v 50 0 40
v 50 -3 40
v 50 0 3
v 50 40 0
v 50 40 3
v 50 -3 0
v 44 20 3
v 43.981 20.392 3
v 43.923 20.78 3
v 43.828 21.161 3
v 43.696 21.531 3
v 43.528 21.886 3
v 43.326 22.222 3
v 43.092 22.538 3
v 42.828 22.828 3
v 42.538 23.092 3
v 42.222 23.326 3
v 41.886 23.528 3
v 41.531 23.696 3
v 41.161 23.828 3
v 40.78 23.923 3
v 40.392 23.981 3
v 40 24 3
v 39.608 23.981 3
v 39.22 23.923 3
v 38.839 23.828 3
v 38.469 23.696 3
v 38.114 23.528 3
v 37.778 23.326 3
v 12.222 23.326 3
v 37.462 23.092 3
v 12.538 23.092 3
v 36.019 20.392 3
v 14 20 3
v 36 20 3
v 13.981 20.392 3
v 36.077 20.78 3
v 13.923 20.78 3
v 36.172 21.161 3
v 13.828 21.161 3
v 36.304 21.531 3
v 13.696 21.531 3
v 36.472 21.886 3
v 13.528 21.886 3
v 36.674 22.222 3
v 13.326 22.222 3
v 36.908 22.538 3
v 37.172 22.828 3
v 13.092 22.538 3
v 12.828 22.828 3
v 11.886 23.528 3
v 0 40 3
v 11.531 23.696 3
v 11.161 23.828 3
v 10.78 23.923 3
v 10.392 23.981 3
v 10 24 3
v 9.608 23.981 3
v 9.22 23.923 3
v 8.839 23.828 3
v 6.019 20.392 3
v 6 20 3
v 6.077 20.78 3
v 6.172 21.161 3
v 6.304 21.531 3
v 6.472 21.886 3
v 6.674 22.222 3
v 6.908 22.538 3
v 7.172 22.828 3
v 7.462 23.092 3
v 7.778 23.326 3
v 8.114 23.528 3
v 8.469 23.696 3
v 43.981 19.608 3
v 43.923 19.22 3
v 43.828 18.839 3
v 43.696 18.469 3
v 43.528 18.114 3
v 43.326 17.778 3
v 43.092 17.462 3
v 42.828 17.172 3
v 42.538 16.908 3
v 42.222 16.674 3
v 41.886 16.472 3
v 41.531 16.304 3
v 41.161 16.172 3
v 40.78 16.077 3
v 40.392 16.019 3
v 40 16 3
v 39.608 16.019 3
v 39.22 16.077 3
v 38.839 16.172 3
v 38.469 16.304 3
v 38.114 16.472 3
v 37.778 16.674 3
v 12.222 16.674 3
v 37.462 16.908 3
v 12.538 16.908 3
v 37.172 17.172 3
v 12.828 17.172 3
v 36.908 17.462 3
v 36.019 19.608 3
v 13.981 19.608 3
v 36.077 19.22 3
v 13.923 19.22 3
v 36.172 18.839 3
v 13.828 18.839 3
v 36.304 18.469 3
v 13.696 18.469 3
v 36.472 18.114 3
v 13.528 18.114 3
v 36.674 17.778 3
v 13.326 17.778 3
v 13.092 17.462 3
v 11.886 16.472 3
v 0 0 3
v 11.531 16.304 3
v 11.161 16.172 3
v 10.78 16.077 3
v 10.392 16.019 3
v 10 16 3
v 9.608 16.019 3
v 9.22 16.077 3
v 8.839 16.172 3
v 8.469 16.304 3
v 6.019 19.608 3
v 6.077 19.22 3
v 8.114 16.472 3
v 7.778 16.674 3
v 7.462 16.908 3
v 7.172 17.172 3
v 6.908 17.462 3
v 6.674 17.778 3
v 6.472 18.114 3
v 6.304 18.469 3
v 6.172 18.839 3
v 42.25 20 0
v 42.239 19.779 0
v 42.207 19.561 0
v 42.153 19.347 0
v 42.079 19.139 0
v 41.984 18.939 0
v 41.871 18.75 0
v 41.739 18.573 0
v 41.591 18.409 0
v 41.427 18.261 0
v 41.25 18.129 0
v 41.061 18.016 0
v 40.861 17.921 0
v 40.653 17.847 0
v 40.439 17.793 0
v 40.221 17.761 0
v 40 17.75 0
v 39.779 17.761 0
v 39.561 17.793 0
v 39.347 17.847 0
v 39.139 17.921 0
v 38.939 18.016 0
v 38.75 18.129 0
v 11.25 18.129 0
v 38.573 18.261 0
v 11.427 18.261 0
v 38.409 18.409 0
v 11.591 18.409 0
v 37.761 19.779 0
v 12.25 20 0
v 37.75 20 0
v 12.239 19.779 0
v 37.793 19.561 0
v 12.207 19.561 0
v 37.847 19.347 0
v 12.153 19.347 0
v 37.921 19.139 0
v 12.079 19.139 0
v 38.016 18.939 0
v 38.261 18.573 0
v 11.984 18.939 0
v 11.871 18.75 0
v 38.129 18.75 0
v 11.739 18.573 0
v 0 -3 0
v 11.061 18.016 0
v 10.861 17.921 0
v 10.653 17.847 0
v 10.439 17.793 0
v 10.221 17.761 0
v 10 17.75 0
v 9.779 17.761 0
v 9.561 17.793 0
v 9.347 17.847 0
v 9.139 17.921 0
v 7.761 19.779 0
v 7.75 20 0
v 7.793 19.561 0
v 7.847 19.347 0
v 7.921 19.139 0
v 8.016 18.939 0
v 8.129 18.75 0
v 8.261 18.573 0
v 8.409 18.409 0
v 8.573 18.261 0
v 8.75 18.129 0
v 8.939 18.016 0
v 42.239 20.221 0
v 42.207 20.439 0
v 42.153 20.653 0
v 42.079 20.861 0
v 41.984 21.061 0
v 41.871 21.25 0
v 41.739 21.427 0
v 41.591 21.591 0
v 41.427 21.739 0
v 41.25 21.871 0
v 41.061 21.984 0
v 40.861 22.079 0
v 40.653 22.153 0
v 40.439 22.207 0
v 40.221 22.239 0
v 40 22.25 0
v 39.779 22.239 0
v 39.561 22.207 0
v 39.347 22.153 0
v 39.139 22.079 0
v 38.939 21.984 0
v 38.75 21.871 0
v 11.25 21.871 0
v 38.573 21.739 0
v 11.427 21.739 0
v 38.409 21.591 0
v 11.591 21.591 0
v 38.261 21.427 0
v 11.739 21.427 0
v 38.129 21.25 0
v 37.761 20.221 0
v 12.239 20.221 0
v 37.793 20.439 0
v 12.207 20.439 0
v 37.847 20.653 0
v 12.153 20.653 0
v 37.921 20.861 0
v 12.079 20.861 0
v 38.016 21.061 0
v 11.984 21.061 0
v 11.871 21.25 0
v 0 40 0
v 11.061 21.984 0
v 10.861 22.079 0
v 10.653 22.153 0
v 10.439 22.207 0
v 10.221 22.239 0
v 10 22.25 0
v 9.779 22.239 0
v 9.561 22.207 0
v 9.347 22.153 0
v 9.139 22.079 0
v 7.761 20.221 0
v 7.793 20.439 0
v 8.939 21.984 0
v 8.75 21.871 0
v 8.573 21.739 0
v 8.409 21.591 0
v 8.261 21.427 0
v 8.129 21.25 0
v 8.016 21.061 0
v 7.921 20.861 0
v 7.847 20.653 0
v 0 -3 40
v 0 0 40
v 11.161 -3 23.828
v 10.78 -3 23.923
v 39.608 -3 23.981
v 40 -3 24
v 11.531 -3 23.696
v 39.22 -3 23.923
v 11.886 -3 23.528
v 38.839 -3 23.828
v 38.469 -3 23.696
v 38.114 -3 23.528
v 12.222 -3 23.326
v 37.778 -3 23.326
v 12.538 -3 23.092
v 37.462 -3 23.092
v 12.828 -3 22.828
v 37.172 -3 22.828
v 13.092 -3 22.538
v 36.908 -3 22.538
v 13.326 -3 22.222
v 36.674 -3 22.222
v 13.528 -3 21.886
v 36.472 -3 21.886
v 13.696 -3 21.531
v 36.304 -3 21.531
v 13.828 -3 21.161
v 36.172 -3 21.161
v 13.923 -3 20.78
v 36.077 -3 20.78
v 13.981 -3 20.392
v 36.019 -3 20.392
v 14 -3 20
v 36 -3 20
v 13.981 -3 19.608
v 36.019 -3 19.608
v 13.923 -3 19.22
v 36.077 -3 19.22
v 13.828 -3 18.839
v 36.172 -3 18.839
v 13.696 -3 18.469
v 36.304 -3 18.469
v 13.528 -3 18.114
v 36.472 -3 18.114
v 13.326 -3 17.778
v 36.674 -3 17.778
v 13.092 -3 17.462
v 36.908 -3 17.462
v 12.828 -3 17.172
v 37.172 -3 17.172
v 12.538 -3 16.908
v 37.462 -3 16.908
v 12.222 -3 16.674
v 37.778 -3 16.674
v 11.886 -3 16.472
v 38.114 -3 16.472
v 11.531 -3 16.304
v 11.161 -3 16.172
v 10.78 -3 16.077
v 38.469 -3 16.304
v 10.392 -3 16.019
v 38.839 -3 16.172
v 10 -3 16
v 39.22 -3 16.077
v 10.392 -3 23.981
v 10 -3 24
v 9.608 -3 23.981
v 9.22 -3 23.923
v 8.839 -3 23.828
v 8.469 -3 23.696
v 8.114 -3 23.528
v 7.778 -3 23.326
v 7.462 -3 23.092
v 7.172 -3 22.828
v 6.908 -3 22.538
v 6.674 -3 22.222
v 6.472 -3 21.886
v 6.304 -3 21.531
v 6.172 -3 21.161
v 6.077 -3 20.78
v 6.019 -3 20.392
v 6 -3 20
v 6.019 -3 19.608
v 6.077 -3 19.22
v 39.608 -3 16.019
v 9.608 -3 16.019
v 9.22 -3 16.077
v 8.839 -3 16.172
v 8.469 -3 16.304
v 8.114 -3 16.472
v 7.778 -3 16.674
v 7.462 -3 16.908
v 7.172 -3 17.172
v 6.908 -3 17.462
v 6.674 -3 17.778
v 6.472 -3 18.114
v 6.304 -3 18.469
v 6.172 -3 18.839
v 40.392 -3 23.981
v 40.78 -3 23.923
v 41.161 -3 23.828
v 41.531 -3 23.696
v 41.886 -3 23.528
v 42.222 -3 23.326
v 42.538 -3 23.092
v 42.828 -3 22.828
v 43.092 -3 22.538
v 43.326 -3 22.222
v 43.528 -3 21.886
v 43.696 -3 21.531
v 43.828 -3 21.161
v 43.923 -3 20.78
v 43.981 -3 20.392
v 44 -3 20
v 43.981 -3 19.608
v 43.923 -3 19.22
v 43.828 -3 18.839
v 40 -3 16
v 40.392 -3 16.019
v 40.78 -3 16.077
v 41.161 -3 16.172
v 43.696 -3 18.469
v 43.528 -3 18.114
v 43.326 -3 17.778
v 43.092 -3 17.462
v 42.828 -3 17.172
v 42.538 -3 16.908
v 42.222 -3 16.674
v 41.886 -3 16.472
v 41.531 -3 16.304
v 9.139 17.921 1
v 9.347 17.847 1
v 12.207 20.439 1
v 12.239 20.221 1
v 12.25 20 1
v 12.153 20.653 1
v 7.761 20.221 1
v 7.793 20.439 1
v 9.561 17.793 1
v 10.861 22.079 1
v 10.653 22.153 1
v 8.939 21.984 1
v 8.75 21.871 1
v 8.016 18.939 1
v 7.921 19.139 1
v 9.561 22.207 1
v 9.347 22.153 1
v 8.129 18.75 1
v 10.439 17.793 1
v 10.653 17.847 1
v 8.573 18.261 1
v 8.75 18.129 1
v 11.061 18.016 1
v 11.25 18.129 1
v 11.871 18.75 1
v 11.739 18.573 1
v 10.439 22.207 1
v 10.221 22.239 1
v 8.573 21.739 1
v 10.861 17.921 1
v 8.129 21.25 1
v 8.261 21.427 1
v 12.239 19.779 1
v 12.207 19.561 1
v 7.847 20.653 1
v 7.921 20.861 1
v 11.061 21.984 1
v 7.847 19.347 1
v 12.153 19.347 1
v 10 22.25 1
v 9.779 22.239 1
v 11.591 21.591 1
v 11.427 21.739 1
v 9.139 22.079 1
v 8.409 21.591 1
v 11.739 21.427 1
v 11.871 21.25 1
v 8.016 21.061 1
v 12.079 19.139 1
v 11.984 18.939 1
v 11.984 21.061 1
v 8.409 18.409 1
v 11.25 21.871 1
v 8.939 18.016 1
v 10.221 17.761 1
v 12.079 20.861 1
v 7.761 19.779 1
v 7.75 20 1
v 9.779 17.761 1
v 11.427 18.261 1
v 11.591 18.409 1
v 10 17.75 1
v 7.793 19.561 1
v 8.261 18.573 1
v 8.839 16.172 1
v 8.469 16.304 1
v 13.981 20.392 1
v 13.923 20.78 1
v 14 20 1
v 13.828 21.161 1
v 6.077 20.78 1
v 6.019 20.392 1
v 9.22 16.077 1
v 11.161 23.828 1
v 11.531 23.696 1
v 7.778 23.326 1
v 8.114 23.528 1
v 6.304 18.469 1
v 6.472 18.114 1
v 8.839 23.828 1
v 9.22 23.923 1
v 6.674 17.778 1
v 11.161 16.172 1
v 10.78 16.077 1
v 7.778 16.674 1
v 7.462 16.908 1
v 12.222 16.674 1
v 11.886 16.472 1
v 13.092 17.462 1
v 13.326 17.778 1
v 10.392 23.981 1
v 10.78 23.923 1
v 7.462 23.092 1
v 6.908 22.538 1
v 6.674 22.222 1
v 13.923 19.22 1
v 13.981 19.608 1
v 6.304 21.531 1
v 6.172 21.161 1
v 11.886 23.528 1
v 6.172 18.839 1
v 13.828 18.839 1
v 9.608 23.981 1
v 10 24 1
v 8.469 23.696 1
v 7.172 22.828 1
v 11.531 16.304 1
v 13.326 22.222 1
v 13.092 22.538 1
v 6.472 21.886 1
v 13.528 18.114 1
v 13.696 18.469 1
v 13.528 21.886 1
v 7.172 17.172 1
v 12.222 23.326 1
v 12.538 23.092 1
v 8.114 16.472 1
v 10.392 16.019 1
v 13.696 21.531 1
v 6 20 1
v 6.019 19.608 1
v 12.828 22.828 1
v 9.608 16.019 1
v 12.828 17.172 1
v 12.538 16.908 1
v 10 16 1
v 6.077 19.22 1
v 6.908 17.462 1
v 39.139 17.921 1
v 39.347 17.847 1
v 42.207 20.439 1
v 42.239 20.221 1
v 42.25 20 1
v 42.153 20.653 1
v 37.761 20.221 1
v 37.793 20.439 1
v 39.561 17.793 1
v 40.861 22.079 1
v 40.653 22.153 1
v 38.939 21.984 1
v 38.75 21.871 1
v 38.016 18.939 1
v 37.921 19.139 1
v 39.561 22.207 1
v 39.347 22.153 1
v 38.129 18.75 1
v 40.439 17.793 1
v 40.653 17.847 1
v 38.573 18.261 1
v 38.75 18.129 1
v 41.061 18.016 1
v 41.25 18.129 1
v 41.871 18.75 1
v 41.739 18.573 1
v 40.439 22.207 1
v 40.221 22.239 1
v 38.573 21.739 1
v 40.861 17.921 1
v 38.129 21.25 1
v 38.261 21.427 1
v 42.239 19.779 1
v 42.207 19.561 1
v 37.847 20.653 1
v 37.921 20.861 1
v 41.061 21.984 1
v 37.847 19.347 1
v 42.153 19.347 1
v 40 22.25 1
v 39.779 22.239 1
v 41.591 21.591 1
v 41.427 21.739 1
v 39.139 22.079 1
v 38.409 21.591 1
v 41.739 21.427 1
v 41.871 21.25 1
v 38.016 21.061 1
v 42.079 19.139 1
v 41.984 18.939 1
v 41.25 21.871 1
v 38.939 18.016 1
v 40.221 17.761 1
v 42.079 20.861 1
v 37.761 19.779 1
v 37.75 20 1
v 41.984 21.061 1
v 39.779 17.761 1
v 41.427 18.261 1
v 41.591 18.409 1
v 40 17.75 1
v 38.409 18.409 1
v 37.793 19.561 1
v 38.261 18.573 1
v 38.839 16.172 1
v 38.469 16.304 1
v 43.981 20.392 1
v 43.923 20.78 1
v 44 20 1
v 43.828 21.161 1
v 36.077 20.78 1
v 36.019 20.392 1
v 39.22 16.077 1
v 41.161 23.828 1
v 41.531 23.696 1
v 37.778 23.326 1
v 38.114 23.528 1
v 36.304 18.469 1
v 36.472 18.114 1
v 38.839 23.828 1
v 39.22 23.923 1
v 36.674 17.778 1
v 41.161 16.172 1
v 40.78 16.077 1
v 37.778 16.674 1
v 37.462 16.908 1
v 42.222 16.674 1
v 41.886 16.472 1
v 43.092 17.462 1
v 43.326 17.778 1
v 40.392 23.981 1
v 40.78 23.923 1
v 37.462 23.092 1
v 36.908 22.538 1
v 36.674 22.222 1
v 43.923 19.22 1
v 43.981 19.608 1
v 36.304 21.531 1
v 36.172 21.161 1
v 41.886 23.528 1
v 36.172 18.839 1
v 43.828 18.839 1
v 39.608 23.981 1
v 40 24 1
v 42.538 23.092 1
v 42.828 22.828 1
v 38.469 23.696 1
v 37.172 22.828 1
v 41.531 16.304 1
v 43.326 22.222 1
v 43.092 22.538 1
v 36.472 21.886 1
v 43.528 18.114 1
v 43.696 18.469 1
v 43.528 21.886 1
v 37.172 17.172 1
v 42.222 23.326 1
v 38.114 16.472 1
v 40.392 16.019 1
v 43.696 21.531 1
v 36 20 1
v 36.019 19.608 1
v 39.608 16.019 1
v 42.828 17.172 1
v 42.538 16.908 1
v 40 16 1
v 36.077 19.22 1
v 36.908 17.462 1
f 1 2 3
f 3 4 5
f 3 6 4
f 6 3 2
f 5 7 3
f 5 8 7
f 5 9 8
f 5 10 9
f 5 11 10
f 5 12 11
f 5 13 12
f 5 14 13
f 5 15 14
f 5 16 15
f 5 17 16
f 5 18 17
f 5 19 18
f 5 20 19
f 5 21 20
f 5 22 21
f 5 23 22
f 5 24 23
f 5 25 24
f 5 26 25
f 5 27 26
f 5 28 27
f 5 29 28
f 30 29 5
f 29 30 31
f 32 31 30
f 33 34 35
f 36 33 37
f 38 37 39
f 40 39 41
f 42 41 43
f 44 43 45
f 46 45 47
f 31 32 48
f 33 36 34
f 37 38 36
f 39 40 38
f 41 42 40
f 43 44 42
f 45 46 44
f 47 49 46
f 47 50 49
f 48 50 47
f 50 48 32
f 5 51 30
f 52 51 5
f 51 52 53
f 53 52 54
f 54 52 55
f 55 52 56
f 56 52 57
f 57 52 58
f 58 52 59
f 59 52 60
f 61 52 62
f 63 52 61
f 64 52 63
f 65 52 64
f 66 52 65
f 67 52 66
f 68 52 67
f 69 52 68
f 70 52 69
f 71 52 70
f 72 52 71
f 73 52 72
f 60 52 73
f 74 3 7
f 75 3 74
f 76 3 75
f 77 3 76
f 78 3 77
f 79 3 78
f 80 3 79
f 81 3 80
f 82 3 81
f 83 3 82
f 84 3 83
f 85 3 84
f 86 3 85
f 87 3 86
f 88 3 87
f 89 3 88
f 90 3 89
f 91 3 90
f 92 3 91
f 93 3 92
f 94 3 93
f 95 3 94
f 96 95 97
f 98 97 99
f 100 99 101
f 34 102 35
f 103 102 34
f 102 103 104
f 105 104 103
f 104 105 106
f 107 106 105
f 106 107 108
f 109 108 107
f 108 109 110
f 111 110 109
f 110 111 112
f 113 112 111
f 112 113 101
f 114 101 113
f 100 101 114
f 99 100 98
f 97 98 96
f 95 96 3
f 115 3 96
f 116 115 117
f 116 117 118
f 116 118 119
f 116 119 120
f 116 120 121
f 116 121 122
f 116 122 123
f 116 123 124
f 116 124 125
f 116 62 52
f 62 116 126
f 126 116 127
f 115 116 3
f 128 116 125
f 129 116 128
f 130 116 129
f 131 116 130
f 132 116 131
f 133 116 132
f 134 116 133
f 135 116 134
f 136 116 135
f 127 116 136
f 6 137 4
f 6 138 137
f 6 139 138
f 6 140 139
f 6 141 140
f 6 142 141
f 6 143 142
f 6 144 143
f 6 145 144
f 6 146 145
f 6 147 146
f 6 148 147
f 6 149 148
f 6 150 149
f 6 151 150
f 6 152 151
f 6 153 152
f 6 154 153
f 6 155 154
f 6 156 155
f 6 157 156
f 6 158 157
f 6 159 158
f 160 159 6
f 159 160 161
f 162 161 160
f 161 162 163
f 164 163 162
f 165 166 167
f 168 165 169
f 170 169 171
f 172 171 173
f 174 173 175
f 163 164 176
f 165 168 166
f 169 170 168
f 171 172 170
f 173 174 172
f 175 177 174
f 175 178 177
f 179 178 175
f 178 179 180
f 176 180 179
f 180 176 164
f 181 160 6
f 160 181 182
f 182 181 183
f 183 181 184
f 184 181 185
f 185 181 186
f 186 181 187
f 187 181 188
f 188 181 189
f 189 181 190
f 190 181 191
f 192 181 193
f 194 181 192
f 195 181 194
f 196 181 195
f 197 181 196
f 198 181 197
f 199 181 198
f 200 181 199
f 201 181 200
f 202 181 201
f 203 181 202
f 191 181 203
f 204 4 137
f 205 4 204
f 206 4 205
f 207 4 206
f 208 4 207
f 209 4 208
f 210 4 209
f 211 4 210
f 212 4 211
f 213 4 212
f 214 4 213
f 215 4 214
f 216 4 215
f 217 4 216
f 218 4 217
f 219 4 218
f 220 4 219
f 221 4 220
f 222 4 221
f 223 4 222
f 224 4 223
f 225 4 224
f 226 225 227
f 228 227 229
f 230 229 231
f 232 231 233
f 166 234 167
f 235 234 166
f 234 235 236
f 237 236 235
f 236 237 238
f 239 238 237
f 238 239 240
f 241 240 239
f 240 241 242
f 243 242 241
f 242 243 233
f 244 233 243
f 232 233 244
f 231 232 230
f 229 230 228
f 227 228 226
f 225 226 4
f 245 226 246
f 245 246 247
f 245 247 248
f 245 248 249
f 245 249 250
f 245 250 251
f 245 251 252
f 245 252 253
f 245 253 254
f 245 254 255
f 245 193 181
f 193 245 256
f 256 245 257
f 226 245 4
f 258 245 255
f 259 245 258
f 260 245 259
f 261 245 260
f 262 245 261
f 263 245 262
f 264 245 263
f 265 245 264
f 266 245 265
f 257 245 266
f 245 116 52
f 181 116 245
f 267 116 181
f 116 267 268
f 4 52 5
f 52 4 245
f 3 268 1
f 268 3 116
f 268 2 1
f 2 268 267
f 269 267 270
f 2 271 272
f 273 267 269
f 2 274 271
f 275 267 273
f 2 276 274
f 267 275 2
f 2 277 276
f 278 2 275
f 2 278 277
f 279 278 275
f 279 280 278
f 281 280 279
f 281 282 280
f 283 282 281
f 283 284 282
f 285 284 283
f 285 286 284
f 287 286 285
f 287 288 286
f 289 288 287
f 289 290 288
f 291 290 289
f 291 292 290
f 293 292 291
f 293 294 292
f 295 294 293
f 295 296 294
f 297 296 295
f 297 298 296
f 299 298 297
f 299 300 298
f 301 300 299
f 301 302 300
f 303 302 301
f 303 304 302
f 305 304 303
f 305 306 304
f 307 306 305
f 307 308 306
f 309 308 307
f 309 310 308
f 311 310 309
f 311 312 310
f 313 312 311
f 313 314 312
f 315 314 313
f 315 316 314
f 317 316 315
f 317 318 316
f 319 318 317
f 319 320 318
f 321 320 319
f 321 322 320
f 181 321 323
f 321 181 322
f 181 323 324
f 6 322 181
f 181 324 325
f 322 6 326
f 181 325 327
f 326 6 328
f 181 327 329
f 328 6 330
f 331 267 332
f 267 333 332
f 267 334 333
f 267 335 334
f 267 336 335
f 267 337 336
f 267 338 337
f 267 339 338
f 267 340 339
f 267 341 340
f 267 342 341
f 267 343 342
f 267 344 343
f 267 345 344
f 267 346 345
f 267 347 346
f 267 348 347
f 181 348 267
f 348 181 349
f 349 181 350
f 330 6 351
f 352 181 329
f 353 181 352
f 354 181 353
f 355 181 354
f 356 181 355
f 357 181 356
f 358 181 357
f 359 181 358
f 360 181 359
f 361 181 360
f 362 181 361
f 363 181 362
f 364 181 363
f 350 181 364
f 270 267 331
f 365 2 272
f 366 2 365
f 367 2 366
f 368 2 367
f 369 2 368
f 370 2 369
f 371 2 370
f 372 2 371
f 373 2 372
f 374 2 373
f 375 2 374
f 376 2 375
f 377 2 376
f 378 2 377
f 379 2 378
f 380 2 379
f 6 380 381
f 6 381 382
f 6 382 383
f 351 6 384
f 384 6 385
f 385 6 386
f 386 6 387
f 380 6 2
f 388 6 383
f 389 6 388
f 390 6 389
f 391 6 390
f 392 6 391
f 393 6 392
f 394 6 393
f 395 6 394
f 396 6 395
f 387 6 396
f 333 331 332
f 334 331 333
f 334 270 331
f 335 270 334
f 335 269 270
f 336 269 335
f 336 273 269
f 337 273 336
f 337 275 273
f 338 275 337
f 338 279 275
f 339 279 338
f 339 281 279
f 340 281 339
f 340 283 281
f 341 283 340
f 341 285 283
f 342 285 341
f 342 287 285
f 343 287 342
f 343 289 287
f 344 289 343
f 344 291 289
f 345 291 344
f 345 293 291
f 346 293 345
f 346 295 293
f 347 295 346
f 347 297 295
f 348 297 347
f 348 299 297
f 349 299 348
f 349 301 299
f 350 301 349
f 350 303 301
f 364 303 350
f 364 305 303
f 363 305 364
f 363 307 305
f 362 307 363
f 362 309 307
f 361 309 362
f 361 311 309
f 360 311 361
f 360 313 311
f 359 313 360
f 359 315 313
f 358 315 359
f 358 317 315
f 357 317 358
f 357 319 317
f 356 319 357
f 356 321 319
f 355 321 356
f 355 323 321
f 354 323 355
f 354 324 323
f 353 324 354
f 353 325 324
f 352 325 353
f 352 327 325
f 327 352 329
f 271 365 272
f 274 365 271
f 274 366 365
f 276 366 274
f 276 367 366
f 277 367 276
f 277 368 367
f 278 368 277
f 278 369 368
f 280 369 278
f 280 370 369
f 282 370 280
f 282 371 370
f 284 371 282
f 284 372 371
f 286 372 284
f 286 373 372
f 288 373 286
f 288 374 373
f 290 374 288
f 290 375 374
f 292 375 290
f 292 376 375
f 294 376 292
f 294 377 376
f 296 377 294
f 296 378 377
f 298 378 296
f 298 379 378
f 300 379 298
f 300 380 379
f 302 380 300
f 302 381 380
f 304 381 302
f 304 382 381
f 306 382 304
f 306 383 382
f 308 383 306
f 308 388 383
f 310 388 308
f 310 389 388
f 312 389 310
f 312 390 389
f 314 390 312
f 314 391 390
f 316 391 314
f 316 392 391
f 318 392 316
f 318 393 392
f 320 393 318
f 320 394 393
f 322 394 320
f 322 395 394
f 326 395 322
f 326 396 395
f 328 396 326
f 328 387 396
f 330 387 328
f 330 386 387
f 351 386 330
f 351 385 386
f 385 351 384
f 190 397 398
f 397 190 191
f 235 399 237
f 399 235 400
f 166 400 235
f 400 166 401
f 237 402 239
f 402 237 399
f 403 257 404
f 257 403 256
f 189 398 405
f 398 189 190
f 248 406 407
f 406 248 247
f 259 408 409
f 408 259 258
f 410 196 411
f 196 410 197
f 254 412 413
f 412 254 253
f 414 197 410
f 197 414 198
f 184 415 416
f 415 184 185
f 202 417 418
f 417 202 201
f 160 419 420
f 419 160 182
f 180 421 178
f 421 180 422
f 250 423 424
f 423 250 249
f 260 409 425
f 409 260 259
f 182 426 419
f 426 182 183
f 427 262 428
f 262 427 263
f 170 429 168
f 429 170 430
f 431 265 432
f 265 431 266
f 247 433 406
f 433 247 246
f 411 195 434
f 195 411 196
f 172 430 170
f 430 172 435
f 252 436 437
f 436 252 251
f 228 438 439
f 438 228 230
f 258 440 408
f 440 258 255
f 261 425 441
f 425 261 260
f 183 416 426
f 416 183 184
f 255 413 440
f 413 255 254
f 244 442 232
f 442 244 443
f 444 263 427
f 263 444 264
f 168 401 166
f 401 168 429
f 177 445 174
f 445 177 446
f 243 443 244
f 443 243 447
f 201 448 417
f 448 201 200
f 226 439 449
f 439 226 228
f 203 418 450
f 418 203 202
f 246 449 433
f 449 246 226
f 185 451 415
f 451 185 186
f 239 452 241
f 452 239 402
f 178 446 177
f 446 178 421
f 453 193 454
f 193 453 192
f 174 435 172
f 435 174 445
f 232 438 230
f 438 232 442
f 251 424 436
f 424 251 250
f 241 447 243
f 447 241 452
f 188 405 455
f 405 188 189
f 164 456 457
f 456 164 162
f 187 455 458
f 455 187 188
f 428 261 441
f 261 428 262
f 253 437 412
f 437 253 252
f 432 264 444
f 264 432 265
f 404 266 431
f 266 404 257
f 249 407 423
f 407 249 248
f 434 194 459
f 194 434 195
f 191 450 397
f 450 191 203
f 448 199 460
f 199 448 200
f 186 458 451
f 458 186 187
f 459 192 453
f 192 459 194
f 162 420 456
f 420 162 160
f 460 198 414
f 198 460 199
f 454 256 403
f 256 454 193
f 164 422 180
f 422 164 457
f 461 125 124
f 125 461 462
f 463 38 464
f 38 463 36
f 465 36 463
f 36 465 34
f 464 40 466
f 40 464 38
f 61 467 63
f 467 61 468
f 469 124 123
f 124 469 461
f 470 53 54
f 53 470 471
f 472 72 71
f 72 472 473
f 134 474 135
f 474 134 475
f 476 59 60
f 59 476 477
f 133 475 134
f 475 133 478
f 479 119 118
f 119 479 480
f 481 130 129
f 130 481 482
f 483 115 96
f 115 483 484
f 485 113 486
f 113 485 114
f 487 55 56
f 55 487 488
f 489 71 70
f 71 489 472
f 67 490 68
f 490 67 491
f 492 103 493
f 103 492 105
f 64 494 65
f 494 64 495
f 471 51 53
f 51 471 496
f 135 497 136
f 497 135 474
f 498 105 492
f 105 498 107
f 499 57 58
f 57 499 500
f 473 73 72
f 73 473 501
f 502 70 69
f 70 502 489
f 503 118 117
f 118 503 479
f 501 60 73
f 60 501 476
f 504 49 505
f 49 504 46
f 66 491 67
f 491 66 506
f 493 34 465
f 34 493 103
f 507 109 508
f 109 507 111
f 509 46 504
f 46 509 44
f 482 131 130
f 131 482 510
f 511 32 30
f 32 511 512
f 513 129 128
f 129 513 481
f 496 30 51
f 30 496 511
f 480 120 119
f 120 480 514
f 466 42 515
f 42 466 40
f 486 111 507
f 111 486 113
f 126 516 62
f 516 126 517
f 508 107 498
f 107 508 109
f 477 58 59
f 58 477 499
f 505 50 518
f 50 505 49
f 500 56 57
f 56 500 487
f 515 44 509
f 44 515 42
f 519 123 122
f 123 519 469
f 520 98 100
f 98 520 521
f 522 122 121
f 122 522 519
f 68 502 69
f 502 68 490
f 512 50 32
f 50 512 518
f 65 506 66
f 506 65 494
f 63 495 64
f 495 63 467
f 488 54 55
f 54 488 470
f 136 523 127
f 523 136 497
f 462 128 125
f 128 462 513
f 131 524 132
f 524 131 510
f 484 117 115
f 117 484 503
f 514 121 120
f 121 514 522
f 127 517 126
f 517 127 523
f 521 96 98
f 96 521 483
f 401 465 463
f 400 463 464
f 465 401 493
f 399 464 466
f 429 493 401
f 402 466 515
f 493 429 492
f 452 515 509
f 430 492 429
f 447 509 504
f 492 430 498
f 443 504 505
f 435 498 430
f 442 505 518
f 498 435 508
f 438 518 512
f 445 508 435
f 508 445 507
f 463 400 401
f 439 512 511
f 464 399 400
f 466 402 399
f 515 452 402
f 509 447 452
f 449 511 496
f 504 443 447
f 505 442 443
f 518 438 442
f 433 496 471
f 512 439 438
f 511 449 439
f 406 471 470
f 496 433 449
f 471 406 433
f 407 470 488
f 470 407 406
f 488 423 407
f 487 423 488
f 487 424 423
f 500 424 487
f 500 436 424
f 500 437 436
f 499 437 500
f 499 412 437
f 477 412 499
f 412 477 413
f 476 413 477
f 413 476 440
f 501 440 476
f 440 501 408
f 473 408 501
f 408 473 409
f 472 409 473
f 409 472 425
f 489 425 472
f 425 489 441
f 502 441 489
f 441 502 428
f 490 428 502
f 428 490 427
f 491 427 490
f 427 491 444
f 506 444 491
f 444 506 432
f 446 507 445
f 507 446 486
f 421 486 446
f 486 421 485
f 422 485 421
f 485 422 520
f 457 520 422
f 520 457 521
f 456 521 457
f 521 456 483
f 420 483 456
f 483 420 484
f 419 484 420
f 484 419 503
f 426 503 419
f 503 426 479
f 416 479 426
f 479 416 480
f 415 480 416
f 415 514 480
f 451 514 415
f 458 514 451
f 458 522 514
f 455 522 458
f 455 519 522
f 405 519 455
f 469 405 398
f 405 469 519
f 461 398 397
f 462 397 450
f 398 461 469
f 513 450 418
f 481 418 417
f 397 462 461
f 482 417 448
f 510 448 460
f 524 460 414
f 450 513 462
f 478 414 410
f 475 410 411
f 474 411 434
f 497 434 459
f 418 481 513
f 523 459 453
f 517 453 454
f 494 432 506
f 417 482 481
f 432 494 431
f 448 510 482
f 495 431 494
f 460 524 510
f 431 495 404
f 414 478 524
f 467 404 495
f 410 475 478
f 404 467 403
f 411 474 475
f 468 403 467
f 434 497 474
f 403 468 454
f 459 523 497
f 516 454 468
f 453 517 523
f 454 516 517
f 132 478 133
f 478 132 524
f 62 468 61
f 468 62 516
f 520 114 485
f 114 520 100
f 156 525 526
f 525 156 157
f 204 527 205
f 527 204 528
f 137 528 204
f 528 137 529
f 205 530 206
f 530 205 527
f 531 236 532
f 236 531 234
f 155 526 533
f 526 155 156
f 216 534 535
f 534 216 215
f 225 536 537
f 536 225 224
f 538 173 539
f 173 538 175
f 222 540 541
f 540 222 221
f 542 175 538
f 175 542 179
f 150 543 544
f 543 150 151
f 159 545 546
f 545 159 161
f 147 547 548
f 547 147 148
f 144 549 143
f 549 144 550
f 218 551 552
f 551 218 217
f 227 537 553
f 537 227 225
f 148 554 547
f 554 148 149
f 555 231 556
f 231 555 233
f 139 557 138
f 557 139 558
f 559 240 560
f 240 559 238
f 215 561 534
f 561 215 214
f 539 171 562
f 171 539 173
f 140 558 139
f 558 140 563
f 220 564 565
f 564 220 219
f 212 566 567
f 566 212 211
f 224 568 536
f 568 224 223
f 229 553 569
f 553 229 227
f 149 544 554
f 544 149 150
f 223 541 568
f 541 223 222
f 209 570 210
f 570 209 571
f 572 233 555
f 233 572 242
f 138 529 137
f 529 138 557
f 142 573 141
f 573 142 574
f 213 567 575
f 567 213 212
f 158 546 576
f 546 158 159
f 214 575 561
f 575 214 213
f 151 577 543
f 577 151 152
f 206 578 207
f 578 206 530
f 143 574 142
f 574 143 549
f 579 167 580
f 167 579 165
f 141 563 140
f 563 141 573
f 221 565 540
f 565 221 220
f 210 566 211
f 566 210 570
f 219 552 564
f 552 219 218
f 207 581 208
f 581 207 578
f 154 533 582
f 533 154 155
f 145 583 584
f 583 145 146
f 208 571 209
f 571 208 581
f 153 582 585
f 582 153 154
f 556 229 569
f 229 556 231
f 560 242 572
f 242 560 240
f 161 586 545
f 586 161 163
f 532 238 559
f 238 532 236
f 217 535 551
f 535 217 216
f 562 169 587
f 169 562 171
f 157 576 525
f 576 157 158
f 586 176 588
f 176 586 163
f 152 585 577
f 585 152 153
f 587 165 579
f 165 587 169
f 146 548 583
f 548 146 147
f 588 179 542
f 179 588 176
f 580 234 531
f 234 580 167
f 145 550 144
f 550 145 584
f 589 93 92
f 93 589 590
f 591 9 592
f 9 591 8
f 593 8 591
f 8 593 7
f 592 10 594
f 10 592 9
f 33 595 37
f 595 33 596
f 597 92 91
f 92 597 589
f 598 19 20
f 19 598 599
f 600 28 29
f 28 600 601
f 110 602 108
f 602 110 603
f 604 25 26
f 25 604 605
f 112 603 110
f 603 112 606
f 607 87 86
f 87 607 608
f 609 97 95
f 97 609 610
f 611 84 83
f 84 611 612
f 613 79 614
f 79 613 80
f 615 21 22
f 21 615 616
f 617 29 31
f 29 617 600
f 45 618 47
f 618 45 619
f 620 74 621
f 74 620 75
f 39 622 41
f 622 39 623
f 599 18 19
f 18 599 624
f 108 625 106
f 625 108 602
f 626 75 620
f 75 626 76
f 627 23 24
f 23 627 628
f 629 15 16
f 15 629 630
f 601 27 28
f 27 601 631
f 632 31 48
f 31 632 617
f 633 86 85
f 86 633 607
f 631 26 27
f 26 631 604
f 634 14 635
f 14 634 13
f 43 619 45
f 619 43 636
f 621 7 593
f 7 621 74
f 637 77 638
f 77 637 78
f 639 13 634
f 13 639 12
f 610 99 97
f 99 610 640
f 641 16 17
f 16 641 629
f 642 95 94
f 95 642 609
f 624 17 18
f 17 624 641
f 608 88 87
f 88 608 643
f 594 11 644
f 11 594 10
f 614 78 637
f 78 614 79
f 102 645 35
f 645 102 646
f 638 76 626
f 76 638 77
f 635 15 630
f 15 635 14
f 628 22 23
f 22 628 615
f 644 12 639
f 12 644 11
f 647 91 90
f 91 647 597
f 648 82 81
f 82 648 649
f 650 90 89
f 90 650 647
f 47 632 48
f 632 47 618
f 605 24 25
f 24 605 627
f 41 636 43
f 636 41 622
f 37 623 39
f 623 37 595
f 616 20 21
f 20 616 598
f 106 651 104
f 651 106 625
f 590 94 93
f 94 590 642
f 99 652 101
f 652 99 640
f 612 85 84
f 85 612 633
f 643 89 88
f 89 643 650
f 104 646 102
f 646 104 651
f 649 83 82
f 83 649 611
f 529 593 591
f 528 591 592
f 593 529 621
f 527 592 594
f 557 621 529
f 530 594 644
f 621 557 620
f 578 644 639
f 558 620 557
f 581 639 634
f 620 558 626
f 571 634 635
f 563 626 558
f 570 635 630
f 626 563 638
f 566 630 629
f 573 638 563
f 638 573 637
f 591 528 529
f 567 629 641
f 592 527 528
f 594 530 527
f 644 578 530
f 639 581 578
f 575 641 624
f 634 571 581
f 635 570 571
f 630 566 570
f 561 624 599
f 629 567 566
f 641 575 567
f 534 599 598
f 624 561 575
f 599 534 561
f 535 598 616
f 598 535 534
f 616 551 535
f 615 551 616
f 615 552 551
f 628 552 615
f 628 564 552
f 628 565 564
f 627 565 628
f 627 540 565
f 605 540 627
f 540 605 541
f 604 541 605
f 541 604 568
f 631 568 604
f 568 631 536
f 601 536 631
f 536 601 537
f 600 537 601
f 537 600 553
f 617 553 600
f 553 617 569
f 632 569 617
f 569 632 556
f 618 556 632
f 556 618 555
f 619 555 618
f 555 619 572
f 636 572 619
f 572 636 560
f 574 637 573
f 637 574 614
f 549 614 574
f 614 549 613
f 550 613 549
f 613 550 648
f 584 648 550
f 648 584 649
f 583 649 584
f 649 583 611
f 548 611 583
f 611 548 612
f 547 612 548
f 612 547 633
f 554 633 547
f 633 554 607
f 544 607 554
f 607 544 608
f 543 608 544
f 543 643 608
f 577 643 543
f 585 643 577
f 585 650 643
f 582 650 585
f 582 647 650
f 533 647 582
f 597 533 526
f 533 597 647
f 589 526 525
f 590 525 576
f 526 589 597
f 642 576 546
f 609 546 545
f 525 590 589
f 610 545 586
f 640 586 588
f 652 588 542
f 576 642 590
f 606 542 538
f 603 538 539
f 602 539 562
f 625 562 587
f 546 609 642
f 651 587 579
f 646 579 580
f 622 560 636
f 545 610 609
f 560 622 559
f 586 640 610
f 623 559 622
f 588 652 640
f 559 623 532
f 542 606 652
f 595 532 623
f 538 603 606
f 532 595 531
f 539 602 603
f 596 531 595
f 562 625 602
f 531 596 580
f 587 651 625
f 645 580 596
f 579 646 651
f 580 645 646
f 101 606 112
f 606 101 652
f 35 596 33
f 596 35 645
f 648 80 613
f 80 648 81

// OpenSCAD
// L-bracket with countersunk holes
// Dimensions
WIDTH       = 50;   // X direction (common width of both flanges)
DEPTH       = 40;   // Y direction of horizontal flange
HEIGHT      = 40;   // Z direction of vertical flange
THK         = 3;    // Plate thickness

// Hole parameters
HOLE_D      = 4.5;  // Through-hole diameter (M4 clearance)
CSK_D       = 8;    // Countersink seat diameter
CSK_DEPTH   = 2;    // Countersink depth
EDGE_OFFSET = 10;   // Distance of hole-centres from side edges
$fn = 64;           // Circle resolution

difference() {
    // --- Plates -----------------------------------------------------------
    union() {
        // Horizontal flange (lies in XY plane, thickness +Z)
        cube([WIDTH, DEPTH, THK], center = false);

        // Vertical flange (stands in YZ plane, thickness –Y)
        translate([0, -THK, 0])
            cube([WIDTH, THK, HEIGHT], center = false);
    }

    // --- Countersunk holes ------------------------------------------------
    // Horizontal flange holes (axis = Z)
    for (x = [EDGE_OFFSET, WIDTH - EDGE_OFFSET]) {
        y = DEPTH / 2;

        // Through hole
        translate([x, y, -1])
            cylinder(h = THK + 2, d = HOLE_D);

        // Countersink (from top surface downward)
        translate([x, y, THK - CSK_DEPTH])
            cylinder(h = CSK_DEPTH + 1, d = CSK_D);
    }

    // Vertical flange holes (axis = Y)
    for (x = [EDGE_OFFSET, WIDTH - EDGE_OFFSET]) {
        z = HEIGHT / 2;

        // Through hole
        translate([x, -THK - 1, z])
            rotate([90, 0, 0])
                cylinder(h = THK + 2, d = HOLE_D);

        // Countersink (from outer side toward inside)
        translate([x, -THK, z])
            rotate([90, 0, 0])
                cylinder(h = CSK_DEPTH + 1, d = CSK_D);
    }
}
